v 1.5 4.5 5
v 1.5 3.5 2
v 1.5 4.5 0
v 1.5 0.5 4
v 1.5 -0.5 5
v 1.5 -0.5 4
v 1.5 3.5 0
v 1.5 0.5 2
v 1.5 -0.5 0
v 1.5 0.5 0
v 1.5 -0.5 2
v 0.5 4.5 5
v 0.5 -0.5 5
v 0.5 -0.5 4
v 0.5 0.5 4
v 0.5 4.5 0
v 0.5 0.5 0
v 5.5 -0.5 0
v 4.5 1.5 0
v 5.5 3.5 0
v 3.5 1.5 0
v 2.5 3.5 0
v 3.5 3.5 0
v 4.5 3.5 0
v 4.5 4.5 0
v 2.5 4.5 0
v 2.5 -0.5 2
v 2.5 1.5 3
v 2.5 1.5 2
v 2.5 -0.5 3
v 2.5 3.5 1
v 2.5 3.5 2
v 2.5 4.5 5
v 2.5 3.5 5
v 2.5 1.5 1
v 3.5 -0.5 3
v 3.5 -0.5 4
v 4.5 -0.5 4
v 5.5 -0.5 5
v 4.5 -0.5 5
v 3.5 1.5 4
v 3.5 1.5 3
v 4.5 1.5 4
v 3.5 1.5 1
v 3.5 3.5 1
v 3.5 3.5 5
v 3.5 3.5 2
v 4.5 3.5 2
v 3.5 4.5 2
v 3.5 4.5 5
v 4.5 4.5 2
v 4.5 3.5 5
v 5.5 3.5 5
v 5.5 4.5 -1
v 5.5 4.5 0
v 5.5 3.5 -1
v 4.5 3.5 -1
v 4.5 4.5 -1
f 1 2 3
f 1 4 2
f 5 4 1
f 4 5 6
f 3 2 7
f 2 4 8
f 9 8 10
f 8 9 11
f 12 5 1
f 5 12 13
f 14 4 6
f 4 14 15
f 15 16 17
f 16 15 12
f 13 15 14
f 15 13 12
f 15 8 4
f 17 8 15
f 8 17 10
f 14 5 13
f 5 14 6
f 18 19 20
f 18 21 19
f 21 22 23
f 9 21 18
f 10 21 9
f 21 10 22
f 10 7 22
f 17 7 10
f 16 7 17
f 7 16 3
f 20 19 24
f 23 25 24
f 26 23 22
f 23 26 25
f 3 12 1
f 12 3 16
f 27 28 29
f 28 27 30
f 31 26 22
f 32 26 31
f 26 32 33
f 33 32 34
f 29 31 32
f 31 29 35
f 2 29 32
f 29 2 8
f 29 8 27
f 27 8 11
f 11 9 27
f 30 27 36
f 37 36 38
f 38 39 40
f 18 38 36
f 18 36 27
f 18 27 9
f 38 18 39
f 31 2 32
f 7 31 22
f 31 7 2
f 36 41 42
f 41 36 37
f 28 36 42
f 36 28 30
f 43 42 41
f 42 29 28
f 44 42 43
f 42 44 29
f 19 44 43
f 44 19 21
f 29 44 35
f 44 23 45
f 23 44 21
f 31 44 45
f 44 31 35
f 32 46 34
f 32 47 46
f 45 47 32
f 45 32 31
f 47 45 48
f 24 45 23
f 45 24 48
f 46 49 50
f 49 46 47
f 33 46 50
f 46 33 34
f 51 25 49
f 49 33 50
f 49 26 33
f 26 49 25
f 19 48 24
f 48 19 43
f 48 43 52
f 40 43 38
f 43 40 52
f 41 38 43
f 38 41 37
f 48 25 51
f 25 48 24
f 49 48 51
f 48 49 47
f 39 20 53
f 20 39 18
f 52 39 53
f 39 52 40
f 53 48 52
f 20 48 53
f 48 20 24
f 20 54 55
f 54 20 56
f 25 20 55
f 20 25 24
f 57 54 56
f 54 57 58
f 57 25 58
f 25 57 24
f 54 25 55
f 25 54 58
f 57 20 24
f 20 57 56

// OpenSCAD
union() {
    translate([1, 0, 4.5]) color([1, 0, 0]) cube([1, 1, 1], center=true);
    translate([1, 1, 2.5]) cube([1, 1, 5], center=true);
    translate([1, 2, 2.5]) cube([1, 1, 5], center=true);
    translate([1, 3, 2.5]) cube([1, 1, 5], center=true);
    translate([1, 4, 2.5]) cube([1, 1, 5], center=true);
    translate([2, 0, 1.0]) cube([1, 1, 2], center=true);
    translate([2, 1, 1.0]) cube([1, 1, 2], center=true);
    translate([2, 2, 1.0]) cube([1, 1, 2], center=true);
    translate([2, 3, 1.0]) cube([1, 1, 2], center=true);
    translate([3, 0, 1.5]) cube([1, 1, 3], center=true);
    translate([3, 1, 1.5]) cube([1, 1, 3], center=true);
    translate([3, 2, 0.5]) cube([1, 1, 1], center=true);
    translate([3, 3, 0.5]) cube([1, 1, 1], center=true);
    translate([3, 4, 2.5]) cube([1, 1, 5], center=true);
    translate([4, 0, 2.0]) cube([1, 1, 4], center=true);
    translate([4, 1, 2.0]) cube([1, 1, 4], center=true);
    translate([4, 4, 1.0]) cube([1, 1, 2], center=true);
    translate([5, 0, 2.5]) cube([1, 1, 5], center=true);
    translate([5, 1, 2.5]) cube([1, 1, 5], center=true);
    translate([5, 2, 2.5]) cube([1, 1, 5], center=true);
    translate([5, 3, 2.5]) cube([1, 1, 5], center=true);
    translate([5, 4, -0.5]) color([0, 0, 1]) cube([1, 1, 1], center=true);
}
